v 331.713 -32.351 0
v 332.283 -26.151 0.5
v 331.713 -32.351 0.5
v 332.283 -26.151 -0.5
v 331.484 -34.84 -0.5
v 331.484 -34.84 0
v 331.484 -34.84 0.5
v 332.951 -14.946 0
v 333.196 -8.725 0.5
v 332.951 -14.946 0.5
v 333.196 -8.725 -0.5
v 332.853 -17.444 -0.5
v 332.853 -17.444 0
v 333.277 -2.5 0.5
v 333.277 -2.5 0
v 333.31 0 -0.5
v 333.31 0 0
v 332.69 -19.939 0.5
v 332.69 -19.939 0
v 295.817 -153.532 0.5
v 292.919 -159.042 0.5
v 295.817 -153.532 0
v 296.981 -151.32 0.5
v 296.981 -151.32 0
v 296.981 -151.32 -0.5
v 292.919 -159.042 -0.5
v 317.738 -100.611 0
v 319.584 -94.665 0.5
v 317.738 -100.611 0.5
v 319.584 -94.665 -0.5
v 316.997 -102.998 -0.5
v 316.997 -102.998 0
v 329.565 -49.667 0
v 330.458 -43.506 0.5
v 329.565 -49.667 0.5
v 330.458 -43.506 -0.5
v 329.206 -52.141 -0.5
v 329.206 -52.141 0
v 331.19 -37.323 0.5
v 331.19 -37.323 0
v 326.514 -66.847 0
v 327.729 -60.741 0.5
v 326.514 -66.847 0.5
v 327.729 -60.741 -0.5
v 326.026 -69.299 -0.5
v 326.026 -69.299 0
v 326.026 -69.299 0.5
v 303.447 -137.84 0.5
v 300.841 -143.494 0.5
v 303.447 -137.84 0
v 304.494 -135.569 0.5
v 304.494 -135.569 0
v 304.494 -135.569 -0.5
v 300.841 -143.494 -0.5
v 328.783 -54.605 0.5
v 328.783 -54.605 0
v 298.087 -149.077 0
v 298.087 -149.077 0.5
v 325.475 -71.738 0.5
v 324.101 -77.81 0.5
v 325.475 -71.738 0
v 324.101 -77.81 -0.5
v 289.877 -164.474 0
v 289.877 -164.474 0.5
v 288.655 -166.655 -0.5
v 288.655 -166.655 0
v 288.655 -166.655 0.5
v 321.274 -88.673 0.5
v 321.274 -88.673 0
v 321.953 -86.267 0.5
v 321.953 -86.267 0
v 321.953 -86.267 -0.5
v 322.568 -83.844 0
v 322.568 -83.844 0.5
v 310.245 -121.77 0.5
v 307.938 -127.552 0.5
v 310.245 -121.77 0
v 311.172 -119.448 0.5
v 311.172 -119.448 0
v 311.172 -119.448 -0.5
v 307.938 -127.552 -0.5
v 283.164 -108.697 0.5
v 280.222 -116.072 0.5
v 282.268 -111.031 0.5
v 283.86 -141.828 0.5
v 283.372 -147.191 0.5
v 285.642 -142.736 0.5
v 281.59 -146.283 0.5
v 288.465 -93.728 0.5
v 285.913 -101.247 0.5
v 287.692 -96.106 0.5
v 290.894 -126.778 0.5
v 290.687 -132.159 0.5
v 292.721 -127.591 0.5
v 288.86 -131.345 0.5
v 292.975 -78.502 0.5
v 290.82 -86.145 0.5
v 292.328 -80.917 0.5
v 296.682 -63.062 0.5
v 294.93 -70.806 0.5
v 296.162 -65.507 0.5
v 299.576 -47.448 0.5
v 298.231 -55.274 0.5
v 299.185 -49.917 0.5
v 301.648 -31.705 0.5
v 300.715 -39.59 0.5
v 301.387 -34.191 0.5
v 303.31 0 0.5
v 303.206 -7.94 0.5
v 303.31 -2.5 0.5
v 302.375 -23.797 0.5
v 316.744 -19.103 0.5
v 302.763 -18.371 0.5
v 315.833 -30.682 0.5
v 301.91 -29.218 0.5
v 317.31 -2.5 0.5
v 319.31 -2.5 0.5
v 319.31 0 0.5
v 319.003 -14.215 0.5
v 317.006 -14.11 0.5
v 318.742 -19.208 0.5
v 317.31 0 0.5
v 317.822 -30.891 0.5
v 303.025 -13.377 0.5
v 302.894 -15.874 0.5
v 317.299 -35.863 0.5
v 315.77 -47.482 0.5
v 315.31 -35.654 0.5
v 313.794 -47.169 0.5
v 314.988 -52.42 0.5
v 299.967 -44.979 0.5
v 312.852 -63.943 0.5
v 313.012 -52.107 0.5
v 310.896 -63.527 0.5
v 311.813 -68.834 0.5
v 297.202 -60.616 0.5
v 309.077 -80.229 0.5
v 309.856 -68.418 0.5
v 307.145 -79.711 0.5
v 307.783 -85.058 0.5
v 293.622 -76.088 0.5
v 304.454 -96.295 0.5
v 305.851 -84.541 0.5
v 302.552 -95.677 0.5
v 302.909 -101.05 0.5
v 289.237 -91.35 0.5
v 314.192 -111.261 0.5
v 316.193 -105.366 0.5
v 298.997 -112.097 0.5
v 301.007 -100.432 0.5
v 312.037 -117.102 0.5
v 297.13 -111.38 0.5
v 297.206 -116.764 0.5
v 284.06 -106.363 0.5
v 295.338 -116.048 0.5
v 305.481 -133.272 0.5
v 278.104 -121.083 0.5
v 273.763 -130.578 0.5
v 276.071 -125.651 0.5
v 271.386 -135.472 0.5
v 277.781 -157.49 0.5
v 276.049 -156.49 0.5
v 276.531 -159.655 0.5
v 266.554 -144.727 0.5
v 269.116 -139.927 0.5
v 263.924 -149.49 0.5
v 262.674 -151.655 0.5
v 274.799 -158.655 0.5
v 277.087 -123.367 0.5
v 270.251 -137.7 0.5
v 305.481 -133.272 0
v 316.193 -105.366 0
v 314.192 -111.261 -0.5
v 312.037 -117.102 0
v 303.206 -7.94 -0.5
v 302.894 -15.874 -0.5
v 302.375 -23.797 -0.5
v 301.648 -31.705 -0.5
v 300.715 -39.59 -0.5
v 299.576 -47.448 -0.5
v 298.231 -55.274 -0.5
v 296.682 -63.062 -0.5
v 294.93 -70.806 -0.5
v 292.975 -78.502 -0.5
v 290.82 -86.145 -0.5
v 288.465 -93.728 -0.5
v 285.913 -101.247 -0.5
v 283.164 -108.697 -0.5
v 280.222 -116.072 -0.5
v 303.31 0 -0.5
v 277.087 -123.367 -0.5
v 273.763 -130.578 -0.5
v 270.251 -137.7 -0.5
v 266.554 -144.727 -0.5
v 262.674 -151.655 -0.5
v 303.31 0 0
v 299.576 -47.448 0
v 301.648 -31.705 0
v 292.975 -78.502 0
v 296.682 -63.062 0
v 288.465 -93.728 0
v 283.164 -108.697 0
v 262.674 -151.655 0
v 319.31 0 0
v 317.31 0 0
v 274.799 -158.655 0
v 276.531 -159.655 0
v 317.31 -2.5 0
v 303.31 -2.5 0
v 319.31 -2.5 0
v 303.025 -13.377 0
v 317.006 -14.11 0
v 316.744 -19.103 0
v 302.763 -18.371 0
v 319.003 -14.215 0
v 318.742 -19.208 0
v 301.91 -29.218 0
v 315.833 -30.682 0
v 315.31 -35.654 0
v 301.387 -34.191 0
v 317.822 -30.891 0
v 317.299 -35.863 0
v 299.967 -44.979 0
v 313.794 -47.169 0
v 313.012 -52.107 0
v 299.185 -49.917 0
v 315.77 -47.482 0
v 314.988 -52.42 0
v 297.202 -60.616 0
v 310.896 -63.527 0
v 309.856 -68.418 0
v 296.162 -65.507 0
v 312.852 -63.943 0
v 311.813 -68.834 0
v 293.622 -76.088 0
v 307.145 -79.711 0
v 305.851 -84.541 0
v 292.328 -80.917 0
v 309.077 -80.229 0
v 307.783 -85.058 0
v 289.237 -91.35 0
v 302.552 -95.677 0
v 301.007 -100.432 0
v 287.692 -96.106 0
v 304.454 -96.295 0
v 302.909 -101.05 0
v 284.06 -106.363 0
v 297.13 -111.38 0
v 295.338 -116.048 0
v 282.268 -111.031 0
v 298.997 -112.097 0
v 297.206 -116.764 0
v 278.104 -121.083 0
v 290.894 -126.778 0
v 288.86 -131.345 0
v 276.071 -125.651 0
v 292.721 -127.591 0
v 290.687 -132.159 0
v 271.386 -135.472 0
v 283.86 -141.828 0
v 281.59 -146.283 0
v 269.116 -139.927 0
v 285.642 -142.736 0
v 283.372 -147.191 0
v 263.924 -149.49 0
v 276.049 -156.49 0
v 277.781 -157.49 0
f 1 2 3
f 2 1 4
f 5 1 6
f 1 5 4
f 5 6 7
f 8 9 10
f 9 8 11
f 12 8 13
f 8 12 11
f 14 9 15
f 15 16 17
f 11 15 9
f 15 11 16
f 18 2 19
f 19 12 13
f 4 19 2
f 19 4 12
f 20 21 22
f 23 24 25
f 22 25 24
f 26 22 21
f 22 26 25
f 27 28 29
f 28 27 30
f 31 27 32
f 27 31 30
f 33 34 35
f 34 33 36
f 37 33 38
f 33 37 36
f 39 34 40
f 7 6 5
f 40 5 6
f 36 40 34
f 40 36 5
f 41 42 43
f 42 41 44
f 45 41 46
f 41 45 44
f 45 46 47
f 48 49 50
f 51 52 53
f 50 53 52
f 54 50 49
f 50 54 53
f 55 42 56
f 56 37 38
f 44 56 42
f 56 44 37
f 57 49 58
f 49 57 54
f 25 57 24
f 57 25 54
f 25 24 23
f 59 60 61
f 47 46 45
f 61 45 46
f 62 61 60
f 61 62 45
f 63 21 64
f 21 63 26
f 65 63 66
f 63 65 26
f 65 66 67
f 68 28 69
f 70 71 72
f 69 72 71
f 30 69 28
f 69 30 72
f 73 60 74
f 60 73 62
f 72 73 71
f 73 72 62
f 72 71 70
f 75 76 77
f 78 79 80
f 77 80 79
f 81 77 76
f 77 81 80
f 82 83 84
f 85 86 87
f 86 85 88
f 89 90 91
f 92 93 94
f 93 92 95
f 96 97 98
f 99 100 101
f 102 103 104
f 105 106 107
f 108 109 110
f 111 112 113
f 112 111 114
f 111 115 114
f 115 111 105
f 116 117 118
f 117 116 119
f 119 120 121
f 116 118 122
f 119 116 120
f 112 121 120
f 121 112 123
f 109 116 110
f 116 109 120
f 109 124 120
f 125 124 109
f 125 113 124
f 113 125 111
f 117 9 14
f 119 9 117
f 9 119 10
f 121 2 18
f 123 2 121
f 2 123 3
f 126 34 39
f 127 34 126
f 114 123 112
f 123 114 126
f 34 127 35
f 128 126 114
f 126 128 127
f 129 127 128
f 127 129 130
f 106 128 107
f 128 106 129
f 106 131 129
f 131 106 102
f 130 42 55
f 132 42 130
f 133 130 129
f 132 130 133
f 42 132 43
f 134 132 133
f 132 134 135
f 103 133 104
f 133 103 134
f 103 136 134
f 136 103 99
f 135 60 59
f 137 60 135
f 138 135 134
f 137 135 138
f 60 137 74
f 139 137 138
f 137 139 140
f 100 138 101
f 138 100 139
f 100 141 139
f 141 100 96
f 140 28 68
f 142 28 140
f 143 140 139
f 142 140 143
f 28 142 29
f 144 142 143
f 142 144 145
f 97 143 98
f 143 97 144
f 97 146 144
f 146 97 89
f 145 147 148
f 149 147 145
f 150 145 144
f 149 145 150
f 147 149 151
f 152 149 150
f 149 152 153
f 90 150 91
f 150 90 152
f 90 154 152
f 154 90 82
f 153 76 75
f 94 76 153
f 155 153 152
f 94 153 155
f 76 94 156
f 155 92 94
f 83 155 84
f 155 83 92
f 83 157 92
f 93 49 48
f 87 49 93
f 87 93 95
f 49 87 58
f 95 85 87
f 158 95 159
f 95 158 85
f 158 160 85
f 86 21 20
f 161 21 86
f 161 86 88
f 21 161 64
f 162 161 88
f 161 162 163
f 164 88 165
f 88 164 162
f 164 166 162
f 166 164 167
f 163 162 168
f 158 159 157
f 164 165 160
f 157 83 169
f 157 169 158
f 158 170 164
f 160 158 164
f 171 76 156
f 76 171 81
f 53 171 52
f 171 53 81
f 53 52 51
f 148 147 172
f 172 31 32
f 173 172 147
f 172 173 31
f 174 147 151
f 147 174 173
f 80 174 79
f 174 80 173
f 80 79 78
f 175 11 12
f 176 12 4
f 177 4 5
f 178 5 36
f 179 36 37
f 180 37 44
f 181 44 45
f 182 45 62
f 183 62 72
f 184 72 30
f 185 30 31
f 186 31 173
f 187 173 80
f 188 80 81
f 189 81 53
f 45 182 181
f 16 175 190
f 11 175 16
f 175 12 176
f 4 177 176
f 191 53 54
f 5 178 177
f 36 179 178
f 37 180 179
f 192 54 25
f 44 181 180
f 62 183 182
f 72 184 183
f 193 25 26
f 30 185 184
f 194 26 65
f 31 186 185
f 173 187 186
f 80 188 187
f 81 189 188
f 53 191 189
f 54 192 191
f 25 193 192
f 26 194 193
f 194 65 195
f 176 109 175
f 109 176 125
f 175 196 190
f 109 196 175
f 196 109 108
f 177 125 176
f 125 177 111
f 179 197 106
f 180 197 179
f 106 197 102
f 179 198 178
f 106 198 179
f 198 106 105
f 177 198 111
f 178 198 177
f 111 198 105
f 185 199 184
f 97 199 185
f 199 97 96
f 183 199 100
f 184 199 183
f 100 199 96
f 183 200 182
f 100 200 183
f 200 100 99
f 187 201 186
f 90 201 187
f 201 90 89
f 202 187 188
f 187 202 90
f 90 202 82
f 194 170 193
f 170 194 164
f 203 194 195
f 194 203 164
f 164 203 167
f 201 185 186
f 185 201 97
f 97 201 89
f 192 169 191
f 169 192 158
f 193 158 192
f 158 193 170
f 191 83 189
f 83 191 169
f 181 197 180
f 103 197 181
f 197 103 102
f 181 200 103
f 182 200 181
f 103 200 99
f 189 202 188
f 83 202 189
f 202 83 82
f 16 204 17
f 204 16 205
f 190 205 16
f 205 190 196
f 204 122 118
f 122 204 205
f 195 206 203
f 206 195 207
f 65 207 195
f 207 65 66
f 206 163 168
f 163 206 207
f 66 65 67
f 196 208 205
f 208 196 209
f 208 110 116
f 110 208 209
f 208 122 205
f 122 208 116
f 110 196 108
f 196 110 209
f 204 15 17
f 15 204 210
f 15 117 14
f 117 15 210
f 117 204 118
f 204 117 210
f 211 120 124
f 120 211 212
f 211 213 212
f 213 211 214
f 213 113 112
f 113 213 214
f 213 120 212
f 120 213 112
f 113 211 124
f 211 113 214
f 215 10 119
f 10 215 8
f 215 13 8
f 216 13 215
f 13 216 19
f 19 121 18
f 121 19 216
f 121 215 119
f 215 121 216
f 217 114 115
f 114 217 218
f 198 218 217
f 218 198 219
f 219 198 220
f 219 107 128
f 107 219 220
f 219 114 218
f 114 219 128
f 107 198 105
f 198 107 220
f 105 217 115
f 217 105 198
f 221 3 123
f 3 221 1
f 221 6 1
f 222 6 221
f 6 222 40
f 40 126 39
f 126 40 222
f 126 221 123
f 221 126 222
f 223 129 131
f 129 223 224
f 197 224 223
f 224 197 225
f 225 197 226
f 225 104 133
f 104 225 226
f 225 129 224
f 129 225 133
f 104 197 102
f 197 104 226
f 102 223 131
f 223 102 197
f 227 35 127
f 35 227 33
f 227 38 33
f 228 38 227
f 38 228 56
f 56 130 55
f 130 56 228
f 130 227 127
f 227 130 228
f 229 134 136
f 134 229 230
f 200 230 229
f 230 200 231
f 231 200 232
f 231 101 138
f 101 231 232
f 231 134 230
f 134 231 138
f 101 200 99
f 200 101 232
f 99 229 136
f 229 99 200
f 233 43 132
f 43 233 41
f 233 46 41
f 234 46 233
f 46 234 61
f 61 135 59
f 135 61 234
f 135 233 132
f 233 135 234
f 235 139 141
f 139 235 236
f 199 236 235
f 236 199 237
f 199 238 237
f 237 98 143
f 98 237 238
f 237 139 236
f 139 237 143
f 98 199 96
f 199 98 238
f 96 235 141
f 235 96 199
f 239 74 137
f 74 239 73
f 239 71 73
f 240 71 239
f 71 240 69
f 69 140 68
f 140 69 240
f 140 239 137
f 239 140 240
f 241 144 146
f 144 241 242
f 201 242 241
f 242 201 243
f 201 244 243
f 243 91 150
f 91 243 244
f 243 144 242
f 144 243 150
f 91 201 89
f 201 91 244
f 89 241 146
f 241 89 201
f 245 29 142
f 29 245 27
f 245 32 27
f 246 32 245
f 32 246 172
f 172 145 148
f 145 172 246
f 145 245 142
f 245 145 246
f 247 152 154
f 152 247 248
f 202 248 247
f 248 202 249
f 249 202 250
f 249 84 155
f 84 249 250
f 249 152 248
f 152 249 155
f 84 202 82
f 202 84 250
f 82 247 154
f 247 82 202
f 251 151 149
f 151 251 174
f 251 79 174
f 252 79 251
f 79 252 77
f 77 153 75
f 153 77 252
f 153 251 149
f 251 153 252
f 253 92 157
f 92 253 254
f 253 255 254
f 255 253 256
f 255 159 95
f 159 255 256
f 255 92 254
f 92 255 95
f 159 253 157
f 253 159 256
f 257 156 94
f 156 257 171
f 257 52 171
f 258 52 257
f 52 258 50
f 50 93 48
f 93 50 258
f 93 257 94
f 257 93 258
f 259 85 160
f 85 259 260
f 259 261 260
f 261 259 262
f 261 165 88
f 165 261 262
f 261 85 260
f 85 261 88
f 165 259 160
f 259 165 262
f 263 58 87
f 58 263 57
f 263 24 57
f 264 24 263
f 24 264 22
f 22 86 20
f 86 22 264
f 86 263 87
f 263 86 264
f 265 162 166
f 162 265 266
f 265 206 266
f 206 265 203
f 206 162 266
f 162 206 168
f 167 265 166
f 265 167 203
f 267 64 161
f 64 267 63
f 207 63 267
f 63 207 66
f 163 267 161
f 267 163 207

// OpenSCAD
module ring (ring_height = 2,
    r1 = 333.310,
    r2 = 303.310,
    light_gap_inner = 1.5,
    light_gap_outer = 1.5,
    sep_thickness = 4,
    sep_height = 12,
    $fn = 240) {

    sep_length_outer = (r1 - r2 - light_gap_outer*2) / 2;
    sep_length_inner = (r1 - r2 - light_gap_inner*2) / 2;


    difference() {
        union() {
            difference() {
                cylinder(h = ring_height, r1 = r1, r2 = r1, center = true);
                cylinder(h = ring_height+1, r1 = r2, r2 = r2, center = true);
            };
    
            for (i = [90:100])
            rotate(i * 3){
                translate([0, r2 + sep_length_inner / 2, sep_height / 2 + ring_height / 2]) {
                    cube(size = [sep_thickness, sep_length_inner, sep_height], center = true);
                }
                translate([0, r1 - sep_length_outer / 2, sep_height / 2 + ring_height / 2]) {
                    cube(size = [sep_thickness, sep_length_outer, sep_height], center = true);
                }
            }
        }

        translate([0, 0, -ring_height/2 - 1]) {
            translate([-r1-1, -r1-1, 0]) {
                cube([r1+1, 2*r1+1, sep_height + ring_height + 2], center = false);
            }
            translate([-r1-1, -r1-1, 0]) {
                cube([2*r1+2, r1+1, sep_height + ring_height + 2], center = false);
            }
            rotate(30) {
                cube([r1+1, r1+1, sep_height + ring_height + 2], center = false);
            }
        }
    }
}

module inv_ring (ring_height = 1,
    r1 = 333.310,
    r2 = 303.310,
    light_gap_inner = 1.5,
    light_gap_outer = 1.5,
    sep_thickness = 4,
    sep_height = 12,
    $fn = 240,
    tolerance = 0.5) {

    rotate([0,180,180]) difference() {
        difference() {
            cylinder(h = ring_height, r1 = r1, r2 = r1, center = true);
            cylinder(h = ring_height+1, r1 = r2, r2 = r2, center = true);
        };
    
        translate([0, 0, -ring_height/2 - 1]) {
            translate([-r1-1, -r1-1, 0]) {
                cube([r1+1, 2*r1+1, sep_height + ring_height + 2], center = false);
            }
            translate([-r1-1, -r1-1, 0]) {
                cube([2*r1+2, r1+1, sep_height + ring_height + 2], center = false);
            }
            rotate(30) {
                cube([r1+1, r1+1, sep_height + ring_height + 2], center = false);
            }
        }

        translate([0, 0, -sep_height-ring_height/2]) ring(ring_height, r1, r2, light_gap_inner - tolerance, light_gap_outer - tolerance, sep_thickness + tolerance*2, sep_height, $fn);
    }
}


//ring_height = 2;
//r1 = 333.310;
//r2 = 303.310;
//light_gap = 3;
//sep_thickness = 4;
//sep_height = 12;
//tolerance = 0.5;
//
//difference(){
//inv_ring();
////ring();
//translate([0,0,-1])
//difference(){
//cylinder(h=2, r1=r2, r2=r2+(r1 - r2)/2, $fn=240);
//rotate([0,180,180])translate([0, 0, -sep_height-ring_height/2]) ring(ring_height, r1, r2, light_gap - tolerance*2, sep_thickness + tolerance*2, sep_height, $fn);
//}
//}


//        difference(){
//            difference() {
//                cylinder(h = ring_height+1, r1 = r1, r2 = r1, center = true);
//                cylinder(h = ring_height+2, r1 = r2, r2 = r2, center = true);
//
//            };
//
//            difference() {
//                cylinder(h = ring_height+3, r1 = r1-sep_length, r2 = r1-sep_length, center = true);
//                cylinder(h = ring_height+4, r1 = r2+sep_length, r2 = r2+sep_length, center = true);
//            };
//
//            for (i = [80:90])
//            rotate(i * 3){
//                translate([0, r2 + sep_length / 2, -ring_height]) {
//                    cube(size = [sep_thickness+4*tolerance, r1, 2*sep_height], center = true);
//                }
//            };
//        }

inv_ring();
//ring();
